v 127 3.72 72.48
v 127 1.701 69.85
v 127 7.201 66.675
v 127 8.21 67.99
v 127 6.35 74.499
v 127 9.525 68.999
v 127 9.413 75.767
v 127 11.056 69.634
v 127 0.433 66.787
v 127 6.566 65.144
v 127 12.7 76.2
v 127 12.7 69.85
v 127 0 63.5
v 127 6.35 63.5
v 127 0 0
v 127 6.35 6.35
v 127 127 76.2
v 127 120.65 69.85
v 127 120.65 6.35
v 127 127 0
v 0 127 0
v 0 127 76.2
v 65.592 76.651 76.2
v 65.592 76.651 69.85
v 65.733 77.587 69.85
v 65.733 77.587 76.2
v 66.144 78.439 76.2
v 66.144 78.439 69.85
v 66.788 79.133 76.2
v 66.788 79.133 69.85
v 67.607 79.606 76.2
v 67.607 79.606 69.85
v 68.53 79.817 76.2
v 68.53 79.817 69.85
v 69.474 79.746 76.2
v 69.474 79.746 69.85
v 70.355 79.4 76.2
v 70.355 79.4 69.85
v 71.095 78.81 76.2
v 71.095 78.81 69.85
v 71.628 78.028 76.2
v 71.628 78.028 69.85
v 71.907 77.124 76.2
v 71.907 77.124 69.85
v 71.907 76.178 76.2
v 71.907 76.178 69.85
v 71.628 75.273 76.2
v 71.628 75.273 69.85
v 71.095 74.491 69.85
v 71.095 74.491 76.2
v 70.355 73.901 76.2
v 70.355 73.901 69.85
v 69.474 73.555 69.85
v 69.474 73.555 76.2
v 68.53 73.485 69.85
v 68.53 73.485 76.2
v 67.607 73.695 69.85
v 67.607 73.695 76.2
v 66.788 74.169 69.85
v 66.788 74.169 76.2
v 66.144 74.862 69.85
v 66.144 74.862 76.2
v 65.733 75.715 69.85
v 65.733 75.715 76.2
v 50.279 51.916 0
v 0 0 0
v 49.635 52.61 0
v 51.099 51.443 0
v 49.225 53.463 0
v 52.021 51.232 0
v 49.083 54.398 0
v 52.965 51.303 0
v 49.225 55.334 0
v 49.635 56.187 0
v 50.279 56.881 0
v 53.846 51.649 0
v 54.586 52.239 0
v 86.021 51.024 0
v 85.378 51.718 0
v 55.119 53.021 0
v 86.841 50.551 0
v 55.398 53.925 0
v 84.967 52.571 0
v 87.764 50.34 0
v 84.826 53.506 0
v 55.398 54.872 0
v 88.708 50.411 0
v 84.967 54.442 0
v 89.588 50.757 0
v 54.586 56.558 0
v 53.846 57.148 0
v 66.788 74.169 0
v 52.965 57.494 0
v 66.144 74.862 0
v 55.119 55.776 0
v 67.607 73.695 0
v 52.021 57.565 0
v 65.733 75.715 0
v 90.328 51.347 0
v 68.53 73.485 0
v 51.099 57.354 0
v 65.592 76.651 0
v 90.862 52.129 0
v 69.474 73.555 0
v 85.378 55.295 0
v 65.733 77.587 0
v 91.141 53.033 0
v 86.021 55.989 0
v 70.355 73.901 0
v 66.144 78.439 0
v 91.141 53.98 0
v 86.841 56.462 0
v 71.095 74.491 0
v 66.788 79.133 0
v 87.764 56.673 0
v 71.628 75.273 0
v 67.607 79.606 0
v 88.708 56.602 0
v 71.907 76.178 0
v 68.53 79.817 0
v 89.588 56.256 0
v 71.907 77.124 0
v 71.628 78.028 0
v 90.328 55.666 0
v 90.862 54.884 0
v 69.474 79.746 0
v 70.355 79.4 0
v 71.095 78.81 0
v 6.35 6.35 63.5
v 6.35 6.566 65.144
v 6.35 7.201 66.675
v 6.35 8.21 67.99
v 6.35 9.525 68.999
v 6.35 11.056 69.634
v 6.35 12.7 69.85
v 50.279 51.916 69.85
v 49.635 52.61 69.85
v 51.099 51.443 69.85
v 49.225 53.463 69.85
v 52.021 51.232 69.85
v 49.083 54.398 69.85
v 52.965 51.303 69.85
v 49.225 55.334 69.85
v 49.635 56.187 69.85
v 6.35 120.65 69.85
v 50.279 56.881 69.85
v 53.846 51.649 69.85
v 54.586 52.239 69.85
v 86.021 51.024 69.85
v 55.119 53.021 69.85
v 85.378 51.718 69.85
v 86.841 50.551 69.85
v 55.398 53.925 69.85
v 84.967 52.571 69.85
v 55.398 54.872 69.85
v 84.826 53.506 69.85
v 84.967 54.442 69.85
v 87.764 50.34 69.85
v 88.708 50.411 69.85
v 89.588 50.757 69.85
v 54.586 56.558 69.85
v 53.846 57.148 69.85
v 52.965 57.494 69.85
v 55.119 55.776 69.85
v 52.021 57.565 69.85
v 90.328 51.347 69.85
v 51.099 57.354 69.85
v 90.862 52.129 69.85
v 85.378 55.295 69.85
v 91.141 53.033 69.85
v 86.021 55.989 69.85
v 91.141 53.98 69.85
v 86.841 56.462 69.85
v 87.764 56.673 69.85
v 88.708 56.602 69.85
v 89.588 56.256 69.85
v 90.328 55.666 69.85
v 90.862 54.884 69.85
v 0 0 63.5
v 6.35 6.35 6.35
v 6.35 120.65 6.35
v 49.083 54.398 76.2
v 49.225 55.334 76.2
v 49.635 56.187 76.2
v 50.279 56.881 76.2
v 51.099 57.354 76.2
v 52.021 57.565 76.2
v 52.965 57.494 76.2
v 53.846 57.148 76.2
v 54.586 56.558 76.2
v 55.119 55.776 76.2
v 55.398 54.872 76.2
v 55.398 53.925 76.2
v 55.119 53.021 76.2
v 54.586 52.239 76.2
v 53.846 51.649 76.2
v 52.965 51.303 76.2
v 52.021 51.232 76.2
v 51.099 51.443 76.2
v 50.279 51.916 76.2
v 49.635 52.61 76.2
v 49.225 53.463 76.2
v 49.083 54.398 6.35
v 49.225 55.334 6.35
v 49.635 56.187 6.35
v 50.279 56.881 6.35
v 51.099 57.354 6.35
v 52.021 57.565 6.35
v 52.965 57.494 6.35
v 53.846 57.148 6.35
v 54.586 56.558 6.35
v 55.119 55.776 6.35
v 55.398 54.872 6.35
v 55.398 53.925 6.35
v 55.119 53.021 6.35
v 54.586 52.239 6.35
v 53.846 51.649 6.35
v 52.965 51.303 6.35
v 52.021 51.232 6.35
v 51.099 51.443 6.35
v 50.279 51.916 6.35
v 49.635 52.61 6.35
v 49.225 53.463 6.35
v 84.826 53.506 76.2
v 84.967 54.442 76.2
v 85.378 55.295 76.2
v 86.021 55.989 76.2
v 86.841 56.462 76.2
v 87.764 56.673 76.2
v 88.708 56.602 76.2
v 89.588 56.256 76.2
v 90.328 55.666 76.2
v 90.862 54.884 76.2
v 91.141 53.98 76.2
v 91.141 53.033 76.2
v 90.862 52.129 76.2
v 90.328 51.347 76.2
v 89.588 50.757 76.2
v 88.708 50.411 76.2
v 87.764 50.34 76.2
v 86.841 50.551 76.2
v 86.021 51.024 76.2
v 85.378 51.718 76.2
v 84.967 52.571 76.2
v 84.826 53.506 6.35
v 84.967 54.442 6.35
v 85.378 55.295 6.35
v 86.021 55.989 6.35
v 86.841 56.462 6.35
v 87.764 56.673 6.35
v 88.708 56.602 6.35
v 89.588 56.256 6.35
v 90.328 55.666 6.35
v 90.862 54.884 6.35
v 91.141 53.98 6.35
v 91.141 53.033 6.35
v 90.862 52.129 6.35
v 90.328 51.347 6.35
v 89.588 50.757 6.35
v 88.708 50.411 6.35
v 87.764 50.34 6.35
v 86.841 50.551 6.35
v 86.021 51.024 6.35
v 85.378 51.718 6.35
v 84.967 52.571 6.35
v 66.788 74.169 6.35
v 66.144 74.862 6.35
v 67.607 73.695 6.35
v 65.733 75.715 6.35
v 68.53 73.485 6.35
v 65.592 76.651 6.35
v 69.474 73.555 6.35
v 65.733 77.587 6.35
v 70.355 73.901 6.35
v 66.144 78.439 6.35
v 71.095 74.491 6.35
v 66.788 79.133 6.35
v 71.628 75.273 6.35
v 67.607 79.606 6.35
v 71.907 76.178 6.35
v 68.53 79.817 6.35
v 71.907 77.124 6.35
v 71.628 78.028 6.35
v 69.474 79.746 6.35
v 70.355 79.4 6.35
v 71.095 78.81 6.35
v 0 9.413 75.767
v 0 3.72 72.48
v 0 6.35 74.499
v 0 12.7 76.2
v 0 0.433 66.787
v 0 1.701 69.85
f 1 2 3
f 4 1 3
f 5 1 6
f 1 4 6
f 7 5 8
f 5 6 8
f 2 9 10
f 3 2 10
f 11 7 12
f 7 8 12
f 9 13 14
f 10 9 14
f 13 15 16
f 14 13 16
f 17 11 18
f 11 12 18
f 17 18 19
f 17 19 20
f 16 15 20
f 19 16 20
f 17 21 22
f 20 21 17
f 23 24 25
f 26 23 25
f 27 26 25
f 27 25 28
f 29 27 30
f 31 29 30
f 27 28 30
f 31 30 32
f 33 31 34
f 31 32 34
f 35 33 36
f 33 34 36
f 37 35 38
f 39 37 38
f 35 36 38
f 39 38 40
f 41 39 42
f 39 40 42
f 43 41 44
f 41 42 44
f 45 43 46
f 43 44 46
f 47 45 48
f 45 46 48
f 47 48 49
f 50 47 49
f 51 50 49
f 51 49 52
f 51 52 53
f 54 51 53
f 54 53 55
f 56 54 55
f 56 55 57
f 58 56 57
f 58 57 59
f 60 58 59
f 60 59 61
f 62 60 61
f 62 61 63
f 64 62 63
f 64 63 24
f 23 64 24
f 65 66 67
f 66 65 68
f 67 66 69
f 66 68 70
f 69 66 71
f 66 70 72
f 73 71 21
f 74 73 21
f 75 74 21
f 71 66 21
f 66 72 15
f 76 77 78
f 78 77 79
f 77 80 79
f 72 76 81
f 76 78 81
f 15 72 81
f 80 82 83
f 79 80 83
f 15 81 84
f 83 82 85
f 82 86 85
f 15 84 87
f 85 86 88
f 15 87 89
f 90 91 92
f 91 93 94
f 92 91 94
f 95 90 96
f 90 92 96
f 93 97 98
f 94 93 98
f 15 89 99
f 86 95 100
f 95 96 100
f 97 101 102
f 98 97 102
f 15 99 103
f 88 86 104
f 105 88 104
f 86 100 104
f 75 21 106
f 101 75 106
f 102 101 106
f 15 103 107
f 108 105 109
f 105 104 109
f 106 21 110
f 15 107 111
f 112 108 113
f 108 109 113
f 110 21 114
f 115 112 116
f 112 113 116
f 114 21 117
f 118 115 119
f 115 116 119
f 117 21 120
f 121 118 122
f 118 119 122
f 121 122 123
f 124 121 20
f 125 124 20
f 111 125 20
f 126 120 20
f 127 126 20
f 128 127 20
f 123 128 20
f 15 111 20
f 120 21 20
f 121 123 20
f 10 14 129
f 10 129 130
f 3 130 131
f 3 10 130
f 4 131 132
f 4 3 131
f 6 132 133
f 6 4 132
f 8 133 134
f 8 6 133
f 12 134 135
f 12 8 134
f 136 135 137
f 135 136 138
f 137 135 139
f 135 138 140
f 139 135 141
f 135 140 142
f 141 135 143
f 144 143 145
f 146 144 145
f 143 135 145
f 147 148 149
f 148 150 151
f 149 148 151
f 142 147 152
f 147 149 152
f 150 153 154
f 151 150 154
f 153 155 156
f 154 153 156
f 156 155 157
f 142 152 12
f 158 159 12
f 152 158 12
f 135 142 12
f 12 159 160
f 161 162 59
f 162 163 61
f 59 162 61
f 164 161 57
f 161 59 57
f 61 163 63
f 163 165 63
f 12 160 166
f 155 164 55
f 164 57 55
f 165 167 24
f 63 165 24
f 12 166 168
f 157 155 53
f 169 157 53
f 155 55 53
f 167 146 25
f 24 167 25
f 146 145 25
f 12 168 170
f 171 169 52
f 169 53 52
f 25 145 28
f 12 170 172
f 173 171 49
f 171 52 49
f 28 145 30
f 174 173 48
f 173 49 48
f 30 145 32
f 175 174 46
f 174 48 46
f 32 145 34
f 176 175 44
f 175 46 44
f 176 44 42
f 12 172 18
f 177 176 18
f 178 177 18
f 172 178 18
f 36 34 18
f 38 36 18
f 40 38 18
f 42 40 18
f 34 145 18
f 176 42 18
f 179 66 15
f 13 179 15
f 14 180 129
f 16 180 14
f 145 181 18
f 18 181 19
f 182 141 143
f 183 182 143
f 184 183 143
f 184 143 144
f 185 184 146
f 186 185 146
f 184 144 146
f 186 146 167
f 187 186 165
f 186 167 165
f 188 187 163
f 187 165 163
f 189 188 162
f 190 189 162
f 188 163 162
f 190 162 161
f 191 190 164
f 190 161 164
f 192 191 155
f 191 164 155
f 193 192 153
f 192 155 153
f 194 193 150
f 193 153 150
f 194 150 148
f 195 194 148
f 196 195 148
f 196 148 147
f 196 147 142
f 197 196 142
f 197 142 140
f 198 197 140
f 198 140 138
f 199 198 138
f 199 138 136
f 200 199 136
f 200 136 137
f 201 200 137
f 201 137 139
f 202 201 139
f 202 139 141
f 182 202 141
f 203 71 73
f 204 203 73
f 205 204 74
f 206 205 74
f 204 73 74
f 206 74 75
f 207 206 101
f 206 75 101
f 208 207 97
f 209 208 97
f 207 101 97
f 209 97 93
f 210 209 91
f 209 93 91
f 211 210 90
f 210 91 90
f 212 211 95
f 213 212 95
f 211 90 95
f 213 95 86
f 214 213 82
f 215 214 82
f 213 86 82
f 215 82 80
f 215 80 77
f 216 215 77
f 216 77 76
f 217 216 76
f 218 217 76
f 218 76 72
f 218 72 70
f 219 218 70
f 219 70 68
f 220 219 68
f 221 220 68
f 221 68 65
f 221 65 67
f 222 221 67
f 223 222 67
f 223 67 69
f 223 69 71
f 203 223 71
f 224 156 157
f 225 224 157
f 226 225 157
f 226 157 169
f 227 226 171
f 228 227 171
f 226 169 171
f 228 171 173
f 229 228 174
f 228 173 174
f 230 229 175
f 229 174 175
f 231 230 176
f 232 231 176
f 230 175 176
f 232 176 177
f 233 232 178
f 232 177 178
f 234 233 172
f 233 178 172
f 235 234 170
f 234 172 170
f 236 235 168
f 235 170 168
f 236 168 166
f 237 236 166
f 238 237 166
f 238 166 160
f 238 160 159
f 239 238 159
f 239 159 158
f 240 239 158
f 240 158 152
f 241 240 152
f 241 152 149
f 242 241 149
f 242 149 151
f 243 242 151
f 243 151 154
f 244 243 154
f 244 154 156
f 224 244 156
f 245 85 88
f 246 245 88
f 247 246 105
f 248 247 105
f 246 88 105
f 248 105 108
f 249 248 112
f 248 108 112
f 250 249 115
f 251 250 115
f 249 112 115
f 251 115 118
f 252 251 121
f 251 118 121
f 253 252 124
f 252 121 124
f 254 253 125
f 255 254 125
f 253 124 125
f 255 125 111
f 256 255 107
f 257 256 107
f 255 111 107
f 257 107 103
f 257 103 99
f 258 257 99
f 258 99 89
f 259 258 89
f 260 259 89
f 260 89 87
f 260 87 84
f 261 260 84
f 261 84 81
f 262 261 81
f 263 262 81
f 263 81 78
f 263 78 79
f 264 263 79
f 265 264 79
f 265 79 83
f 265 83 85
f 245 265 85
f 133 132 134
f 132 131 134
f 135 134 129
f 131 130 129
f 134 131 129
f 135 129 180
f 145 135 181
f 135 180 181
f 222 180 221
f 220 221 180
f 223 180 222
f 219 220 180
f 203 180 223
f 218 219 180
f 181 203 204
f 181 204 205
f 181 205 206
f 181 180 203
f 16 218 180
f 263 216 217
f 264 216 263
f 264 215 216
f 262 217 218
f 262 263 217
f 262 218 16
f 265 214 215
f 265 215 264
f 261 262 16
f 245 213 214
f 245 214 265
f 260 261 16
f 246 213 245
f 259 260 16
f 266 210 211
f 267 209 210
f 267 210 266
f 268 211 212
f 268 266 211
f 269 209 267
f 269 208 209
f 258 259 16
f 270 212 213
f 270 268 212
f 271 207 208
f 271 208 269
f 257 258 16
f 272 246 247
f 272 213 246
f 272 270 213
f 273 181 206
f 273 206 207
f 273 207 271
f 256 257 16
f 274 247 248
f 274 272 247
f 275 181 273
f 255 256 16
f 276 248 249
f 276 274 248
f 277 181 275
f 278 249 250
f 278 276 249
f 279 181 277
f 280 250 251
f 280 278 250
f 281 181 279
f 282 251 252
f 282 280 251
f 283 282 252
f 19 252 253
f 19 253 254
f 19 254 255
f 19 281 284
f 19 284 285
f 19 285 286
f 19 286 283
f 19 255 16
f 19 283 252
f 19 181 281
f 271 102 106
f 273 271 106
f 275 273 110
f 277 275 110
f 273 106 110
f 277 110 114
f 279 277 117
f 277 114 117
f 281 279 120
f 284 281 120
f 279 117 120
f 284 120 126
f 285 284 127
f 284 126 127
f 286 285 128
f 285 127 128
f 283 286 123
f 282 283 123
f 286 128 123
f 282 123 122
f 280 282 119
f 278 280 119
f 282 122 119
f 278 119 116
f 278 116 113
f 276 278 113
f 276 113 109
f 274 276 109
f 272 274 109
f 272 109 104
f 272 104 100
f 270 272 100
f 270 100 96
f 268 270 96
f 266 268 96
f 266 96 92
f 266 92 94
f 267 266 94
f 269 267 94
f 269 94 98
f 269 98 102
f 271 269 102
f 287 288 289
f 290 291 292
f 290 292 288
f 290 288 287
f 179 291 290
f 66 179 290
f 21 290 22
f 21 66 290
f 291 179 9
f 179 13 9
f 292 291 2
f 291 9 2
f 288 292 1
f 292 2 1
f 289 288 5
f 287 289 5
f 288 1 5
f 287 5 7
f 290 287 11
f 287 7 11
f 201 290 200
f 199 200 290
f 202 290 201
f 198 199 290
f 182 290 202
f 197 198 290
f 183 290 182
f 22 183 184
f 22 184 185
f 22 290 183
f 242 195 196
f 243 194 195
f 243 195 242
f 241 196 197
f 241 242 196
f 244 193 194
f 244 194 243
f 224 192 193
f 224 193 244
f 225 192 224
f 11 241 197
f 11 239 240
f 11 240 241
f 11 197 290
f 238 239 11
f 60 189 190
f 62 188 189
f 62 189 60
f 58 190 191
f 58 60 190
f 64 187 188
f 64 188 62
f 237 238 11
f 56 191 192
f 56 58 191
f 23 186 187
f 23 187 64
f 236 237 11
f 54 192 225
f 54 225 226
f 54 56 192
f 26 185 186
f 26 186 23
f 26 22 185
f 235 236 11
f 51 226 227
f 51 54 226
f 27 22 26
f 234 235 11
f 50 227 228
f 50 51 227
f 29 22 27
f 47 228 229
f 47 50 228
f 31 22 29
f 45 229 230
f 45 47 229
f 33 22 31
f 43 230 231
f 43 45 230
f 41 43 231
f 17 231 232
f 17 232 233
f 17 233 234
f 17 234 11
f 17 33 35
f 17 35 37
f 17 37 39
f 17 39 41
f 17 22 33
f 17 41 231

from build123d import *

# Parameters (mm, degrees)
F0_W     = 127
F0_H     = 127
F1_DEPTH = 76.2
F2_R     = 12.7
F3_T     = -6.35
F5_D     = 6.35


with BuildPart() as f1:
    # F0 (on Top) → F1 (new body)
    with BuildSketch(Plane.XY):
        with Locations((63.5, 63.5)):
            Rectangle(F0_W, F0_H)
    extrude(amount=F1_DEPTH)

    # F2
    f2_edges = [f1.edges().sort_by_distance(p)[0] for p in [
        (63.5, 0, 76.2),
    ]]
    fillet(f2_edges, radius=F2_R)

    # F3
    f3_openings = [f1.faces().sort_by_distance(p)[0] for p in [
        (127, 63.717753, 37.973421),
    ]]
    offset(amount=F3_T, openings=f3_openings)

    # F5 (through all)
    with Locations(Plane.XY.offset(76.2)):
        with Locations((52.258465, 54.398425), (68.767309, 76.650865), (88.000998, 53.506445)):
            Hole(F5_D / 2)


solid = f1.part
